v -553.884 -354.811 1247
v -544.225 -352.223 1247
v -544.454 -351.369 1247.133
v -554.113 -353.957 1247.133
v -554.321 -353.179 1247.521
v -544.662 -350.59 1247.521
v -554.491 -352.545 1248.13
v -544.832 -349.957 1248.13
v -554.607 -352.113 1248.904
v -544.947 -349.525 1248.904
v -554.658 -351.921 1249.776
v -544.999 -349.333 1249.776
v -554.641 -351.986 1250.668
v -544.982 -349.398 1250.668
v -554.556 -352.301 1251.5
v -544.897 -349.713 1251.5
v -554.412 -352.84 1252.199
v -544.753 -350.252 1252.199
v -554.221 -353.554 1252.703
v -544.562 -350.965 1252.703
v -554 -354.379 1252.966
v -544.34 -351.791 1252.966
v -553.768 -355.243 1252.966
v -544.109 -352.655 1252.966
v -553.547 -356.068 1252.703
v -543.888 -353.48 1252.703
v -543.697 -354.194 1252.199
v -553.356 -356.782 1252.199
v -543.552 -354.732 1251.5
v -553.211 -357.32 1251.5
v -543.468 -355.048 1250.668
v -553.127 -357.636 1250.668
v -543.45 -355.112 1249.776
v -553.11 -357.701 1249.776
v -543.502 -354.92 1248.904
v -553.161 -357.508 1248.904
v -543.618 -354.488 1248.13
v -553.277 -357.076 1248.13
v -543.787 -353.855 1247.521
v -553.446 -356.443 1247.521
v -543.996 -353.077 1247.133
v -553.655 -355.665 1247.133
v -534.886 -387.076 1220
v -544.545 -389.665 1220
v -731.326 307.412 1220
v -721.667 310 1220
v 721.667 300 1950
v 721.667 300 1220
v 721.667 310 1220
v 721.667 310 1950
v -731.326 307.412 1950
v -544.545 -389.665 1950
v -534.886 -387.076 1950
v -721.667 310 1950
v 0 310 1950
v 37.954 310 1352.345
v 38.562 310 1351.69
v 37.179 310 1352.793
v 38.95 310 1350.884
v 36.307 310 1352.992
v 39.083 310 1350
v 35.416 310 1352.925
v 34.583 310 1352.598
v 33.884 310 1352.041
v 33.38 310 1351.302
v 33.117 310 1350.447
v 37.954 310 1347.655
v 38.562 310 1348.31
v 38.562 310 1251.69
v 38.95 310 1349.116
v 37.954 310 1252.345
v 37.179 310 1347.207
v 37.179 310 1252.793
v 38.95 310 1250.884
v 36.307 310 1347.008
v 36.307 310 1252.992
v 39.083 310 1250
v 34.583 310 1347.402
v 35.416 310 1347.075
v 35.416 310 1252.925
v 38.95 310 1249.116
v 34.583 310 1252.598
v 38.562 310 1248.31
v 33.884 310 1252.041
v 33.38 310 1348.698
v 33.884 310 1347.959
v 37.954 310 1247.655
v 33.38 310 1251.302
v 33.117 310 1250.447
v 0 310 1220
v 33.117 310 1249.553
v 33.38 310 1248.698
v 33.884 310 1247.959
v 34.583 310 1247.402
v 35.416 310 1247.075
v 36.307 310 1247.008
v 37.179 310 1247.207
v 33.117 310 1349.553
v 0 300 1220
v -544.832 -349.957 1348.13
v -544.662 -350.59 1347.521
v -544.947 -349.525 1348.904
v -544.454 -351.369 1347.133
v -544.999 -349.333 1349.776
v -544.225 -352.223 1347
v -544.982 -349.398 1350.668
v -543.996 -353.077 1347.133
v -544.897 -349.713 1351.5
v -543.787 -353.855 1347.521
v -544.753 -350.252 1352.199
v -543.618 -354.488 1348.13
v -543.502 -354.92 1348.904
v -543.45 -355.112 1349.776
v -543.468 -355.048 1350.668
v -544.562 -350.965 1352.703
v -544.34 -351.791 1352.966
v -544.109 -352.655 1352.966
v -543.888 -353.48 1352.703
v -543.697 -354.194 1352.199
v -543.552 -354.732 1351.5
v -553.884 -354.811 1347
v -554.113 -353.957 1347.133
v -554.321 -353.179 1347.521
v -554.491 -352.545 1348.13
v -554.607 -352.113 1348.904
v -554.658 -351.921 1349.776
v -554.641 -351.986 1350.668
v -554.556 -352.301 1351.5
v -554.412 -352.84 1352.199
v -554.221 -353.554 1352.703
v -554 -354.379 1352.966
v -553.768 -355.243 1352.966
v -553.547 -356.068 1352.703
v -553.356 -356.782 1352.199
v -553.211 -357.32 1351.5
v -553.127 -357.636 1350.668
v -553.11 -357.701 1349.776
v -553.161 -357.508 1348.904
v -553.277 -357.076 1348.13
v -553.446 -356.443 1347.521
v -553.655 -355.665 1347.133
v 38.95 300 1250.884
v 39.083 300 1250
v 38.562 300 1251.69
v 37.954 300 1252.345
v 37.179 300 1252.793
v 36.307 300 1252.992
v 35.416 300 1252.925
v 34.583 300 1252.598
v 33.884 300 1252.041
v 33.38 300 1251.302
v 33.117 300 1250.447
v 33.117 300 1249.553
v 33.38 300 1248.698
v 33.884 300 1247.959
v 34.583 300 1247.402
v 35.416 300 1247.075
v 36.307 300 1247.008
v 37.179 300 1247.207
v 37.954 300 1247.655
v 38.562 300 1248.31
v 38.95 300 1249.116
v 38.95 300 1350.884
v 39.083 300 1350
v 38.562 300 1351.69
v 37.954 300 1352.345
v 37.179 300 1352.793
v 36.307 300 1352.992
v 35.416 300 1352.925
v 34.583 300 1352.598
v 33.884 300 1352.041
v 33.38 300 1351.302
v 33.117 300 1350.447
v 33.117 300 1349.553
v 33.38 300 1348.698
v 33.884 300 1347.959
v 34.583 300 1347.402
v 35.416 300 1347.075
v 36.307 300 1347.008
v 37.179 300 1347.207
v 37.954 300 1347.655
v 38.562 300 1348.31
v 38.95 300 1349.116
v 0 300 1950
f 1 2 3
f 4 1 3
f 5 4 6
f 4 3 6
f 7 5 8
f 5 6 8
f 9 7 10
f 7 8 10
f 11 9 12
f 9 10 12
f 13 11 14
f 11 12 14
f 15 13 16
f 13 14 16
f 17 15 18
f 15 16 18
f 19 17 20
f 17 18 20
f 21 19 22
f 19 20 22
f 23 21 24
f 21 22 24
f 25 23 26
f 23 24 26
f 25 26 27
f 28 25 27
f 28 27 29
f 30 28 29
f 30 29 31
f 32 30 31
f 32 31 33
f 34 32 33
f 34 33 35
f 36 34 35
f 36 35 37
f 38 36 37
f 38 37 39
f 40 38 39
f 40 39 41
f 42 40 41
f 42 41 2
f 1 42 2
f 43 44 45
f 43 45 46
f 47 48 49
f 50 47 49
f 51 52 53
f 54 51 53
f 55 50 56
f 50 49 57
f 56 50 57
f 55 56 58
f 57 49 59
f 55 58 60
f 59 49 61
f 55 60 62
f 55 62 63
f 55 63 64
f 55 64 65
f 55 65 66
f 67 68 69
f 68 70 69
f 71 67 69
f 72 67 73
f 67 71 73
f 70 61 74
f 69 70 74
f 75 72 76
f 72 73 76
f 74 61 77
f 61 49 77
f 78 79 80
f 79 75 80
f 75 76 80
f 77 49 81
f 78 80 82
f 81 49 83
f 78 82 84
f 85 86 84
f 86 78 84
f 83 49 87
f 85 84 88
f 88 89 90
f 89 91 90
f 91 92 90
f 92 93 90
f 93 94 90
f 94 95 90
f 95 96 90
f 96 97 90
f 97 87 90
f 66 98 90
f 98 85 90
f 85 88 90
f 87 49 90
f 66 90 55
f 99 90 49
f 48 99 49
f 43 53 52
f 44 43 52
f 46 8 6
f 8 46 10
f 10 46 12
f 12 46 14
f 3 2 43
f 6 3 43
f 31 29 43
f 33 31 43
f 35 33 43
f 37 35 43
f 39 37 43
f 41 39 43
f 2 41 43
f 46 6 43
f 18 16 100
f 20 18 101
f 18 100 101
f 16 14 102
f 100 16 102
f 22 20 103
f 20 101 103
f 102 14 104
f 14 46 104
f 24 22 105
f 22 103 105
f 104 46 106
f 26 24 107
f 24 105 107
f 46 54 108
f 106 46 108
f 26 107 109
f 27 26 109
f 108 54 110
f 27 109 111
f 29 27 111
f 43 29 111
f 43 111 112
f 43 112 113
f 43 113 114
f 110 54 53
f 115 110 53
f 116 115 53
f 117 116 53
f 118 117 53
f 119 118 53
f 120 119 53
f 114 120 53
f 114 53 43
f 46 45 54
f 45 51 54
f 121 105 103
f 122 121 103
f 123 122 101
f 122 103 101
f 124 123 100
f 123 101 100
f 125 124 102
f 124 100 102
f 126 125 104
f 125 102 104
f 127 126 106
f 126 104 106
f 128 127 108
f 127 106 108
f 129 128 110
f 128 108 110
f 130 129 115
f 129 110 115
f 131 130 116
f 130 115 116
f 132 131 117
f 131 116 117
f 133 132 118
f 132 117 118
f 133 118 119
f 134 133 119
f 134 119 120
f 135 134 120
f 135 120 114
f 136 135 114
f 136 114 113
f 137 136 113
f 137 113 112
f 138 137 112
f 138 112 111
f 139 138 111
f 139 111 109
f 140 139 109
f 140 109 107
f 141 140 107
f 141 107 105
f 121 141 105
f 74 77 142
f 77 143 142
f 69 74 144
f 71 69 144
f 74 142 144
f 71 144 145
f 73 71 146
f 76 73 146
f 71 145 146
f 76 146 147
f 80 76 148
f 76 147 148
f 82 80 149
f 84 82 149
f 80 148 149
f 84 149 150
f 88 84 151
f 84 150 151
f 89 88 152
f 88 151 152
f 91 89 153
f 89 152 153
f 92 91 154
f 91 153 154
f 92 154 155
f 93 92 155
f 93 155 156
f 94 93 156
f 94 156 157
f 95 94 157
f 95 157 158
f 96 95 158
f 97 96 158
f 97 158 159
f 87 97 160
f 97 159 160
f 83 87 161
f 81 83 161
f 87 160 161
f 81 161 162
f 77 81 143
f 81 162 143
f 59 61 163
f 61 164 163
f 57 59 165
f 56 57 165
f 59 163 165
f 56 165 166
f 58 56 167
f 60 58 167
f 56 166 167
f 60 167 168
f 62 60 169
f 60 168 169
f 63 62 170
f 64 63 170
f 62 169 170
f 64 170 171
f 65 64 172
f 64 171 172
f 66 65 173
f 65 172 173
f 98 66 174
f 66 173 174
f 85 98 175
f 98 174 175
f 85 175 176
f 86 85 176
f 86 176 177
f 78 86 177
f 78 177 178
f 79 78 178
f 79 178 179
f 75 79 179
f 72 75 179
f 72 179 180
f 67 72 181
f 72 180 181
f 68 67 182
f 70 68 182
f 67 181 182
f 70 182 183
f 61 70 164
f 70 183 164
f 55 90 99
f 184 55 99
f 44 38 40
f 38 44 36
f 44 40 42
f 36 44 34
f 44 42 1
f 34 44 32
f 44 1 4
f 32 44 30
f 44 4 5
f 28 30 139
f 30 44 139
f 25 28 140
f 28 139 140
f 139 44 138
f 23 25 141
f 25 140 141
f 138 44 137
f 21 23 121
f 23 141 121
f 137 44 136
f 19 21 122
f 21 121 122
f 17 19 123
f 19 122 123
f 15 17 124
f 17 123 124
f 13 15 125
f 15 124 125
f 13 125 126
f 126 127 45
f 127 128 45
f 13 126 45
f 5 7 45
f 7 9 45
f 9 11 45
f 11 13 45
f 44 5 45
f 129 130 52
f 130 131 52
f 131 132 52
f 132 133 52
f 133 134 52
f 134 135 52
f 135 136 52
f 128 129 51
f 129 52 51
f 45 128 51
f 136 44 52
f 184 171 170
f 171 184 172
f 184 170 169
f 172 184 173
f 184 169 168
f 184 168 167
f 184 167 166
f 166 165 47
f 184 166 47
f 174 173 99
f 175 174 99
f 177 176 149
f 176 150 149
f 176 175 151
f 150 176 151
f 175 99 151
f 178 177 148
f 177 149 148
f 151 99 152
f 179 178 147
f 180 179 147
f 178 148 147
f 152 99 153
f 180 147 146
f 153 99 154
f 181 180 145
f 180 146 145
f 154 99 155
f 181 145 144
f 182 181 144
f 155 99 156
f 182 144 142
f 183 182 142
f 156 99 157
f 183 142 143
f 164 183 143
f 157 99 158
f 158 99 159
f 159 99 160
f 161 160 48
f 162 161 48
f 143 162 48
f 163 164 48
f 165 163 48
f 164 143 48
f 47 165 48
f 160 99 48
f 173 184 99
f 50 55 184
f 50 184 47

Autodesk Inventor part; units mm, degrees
ref_plane "YZ Plane" through (0, 0, 0) normal (1, 0, 0) x (0, 1, 0)
ref_plane "XZ Plane" through (0, 0, 0) normal (0, 1, 0) x (-1, 0, 0)
ref_plane "Plano de trabajo4" through (0, 0, 1220) normal (0, 0, 1) x (1, 0, 0)
sketch "Boceto8" plane through (0, 0, 1220) normal (0, 0, 1) x (1, 0, 0)
  line L0 (480, 0) -> (0, 0) projected
  line L1 (480, 0) -> (480, 10) projected
  line L2 (0, 10) -> (480, 10) projected
  line L3 (0, 0) -> (0, 10) projected
  line L4 (480, 10) -> (0, 10) projected
  line L5 (0, 10) -> (0, 300)
  line L6 (0, 300) -> (721.6667, 300)
  line L7 (721.6667, 300) -> (721.6667, 310)
  line L8 (721.6667, 310) -> (0, 310)
  line L9 (0, 310) -> (0, 300)
  point P0 (0, 0)
  dimension "d38" = 290
  dimension "d39" = 721.6667
  dimension "d40" = 10
extrude "Extrusión8" add sketch "Boceto8" along normal blind 730 contours L9 L8 L7 L6
sketch "Boceto9" plane through (0, 300, 1220) normal (0, -1, 0) x (1, 0, 0)
  line L0 (0, 0) -> (721.6667, 0) construction
  line L1 (721.6667, 0) -> (721.6667, 730) construction
  line L2 (0, 730) -> (721.6667, 730) construction
  line L3 (0, 0) -> (0, 730) construction
  line L4 (0, 80) -> (721.6667, 80) construction
  line L5 (0, 0) -> (721.6667, 0) construction
  line L6 (36.0833, 0) -> (36.0833, 730) construction
  line L7 (0, 730) -> (721.6667, 730) construction
  circle A0 centre (36.0833, 30) radius 3
  circle A1 centre (36.0833, 130) radius 3
  point P0 (0, -1220)
  dimension "d43" = 36.0833
  dimension "d44" = 80
  dimension "d45" = 6
  dimension "d46" = 50
extrude "Extrusión9" cut sketch "Boceto9" against normal up to next
sketch "Boceto10" plane through (0, 0, 1950) normal (0, 0, 1) x (1, 0, 0)
  line L0 (721.6667, 310) -> (0, 310) projected
  line L1 (0, 310) -> (-721.6667, 310)
  line L2 (-721.6667, 310) -> (-534.8856, -387.0765)
  line L3 (-534.8856, -387.0765) -> (-544.5448, -389.6647)
  line L4 (-544.5448, -389.6647) -> (-731.3259, 307.4118)
  line L5 (-731.3259, 307.4118) -> (-721.6667, 310)
  point P0 (0, 0)
  dimension "d49" = 721.6667
  dimension "d50" = 721.6667
  dimension "angulo" = 75
  dimension "d52" = 10
  dimension "d53" = 721.6667
extrude "Extrusión10" add sketch "Boceto10" against normal blind 730
sketch "Boceto11" plane through (-534.8856, -387.0765, 1950) normal (0.9659, 0.2588, 0) x (0, 0, -1)
  line L0 (0, 721.6667) -> (0, 0) construction
  line L1 (0, 0) -> (730, 0) construction
  line L2 (730, 721.6667) -> (730, 0) construction
  line L3 (0, 721.6667) -> (730, 721.6667) construction
  line L4 (0, 721.6667) -> (0, 0) construction
  line L5 (0, 36.0833) -> (730, 36.0833) construction
  line L6 (0, 0) -> (730, 0) construction
  line L7 (650, 0) -> (650, 721.6667) construction
  line L8 (0, 721.6667) -> (730, 721.6667) construction
  circle A0 centre (700, 36.0833) radius 3
  circle A1 centre (600, 36.0833) radius 3
  point P0 (1950, 235.4486)
  dimension "d56" = 36.0833
  dimension "d57" = 80
  dimension "d58" = 6
  dimension "d59" = 50
extrude "Extrusión11" cut sketch "Boceto11" against normal up to next
equation "\"d39\" = ancho_m"
equation "\"d40\" = espesor"
equation "\"d43\" = 0.05 * ancho_m"
equation "\"d49\" = ancho_m"
equation "\"d50\" = ancho_m"
equation "\"d52\" = espesor"
equation "\"d53\" = ancho_m"
equation "\"d54\" = h_sup"
equation "\"d56\" = 0.05 * ancho_m"
equation "\"d60\" = h_sup"
equation "\"ancho_m\" = 721.666667"
equation "\"espesor\" = 10"
equation "\"h_sup\" = 730"
properties part number "puerta"
